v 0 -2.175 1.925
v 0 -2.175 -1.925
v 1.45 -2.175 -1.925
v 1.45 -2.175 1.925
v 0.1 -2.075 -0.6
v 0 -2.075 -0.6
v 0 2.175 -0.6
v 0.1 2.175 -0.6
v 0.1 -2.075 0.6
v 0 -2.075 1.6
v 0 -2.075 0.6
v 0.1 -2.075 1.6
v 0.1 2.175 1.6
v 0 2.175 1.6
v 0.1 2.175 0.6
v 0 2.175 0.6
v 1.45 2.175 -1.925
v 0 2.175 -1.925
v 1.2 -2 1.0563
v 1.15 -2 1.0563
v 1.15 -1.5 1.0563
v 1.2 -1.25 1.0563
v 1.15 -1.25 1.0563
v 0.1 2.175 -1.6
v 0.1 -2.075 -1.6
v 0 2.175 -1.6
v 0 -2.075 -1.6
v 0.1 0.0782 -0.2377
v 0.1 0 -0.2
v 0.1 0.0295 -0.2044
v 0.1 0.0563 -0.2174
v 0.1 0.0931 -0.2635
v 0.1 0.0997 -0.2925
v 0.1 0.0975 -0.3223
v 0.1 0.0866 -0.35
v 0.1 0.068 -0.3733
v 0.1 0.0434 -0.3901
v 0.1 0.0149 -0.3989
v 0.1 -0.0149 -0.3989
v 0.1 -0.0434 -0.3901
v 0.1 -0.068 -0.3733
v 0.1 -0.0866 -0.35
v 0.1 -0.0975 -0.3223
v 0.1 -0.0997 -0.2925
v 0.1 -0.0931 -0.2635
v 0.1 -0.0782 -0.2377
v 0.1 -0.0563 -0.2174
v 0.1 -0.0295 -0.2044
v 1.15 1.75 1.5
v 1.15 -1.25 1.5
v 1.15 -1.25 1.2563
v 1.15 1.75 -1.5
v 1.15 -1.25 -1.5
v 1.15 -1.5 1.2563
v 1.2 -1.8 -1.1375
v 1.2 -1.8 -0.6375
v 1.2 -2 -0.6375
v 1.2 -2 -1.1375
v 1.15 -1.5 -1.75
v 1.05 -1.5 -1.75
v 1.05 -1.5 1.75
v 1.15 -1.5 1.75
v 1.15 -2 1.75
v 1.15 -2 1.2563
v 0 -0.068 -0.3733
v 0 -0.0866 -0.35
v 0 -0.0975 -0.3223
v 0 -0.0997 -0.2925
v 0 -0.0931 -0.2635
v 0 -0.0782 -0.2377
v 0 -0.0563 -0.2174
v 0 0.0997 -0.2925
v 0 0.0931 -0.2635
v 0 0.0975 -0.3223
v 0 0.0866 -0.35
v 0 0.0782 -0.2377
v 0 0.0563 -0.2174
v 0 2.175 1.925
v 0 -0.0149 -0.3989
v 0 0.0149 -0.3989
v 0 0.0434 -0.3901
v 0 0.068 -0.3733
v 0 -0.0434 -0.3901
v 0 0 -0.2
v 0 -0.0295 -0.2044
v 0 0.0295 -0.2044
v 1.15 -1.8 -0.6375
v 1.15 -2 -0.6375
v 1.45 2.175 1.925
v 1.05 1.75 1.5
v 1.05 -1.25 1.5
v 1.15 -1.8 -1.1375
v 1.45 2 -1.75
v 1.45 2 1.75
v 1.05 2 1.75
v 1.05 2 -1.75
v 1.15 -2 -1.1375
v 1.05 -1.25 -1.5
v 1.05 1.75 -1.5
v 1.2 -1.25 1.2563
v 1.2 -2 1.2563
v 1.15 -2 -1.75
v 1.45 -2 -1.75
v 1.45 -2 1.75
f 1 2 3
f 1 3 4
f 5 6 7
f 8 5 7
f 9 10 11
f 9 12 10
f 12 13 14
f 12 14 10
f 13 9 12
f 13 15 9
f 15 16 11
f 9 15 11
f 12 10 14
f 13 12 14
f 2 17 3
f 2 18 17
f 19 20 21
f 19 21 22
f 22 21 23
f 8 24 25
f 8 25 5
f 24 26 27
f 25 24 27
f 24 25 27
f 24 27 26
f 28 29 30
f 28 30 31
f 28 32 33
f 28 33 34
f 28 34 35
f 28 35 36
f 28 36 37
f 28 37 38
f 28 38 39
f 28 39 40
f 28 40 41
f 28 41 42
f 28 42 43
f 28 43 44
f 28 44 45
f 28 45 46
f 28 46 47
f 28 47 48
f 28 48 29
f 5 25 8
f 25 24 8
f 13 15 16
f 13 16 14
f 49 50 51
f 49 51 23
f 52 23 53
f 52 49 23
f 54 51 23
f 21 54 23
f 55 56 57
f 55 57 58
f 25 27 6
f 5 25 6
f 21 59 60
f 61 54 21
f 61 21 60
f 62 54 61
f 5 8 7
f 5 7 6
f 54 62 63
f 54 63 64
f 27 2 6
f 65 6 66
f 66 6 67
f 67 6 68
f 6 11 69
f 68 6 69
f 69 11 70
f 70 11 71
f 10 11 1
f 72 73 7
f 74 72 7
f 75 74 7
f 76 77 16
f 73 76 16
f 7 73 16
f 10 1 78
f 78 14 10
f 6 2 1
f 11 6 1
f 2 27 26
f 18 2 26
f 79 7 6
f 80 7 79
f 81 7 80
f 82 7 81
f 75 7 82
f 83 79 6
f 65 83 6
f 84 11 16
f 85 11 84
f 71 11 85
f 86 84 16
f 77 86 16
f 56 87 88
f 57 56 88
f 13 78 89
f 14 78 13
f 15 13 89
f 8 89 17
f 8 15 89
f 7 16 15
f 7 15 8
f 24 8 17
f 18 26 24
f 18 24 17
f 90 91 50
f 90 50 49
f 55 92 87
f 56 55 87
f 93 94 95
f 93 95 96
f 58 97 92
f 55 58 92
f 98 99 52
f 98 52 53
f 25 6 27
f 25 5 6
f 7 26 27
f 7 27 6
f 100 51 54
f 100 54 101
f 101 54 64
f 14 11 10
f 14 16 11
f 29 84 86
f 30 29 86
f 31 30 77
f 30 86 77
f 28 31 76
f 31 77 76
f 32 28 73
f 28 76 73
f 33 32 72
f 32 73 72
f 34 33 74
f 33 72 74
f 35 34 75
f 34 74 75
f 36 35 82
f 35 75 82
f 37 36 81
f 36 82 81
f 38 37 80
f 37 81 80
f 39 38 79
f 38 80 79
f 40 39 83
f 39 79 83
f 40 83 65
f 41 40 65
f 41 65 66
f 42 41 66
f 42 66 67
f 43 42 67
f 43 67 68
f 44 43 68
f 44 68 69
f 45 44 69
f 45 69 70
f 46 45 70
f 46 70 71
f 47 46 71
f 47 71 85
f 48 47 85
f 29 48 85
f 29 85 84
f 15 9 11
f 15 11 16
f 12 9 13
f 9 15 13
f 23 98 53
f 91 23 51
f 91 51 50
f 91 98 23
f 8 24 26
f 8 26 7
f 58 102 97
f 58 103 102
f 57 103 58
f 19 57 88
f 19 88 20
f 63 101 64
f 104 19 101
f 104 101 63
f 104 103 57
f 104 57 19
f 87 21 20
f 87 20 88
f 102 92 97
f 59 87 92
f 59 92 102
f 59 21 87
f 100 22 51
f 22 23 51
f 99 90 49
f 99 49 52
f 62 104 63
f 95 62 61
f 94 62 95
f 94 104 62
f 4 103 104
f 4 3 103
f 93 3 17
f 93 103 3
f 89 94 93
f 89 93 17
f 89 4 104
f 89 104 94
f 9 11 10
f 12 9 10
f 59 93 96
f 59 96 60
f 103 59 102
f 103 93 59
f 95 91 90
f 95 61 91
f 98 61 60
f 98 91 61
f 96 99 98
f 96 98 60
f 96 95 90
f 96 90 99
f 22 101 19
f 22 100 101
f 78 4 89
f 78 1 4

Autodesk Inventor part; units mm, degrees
ref_plane "YZ Plane" through (0, 0, 0) normal (1, 0, 0) x (0, 1, 0)
ref_plane "XZ Plane" through (0, 0, 0) normal (0, 1, 0) x (-1, 0, 0)
ref_plane "XY Plane" through (0, 0, 0) normal (0, 0, 1) x (1, 0, 0)
sketch "Sketch1" plane through (0, 0, 0) normal (1, 0, 0) x (0, 1, 0)
  line L0 (-2.175, 1.925) -> (2.175, 1.925)
  line L1 (2.175, 1.925) -> (2.175, -1.925)
  line L2 (2.175, -1.925) -> (-2.175, -1.925)
  line L3 (-2.175, -1.925) -> (-2.175, 1.925)
  line L4 (-2.175, 1.925) -> (2.175, -1.925) construction
  line L5 (2.175, 1.925) -> (-2.175, -1.925) construction
  point P0 (0, 0)
  dimension "d0" = 4.35
  dimension "d1" = 3.85
extrude "Extrusion1" add sketch "Sketch1" along normal blind 1.45
sketch "Sketch2" plane through (1.45, 0, 0) normal (1, 0, 0) x (0, 0, -1)
  line L0 (1.75, -1.5) -> (-1.75, -1.5)
  line L1 (-1.75, -1.5) -> (-1.75, 2)
  line L2 (-1.75, 2) -> (1.75, 2)
  line L3 (1.75, 2) -> (1.75, -1.5)
  line L4 (1.75, -1.5) -> (-1.75, 2) construction
  line L5 (-1.75, -1.5) -> (1.75, 2) construction
  point P0 (0, 0)
  point P1 (0, 0.25)
  dimension "d4" = 0.25
  dimension "d5" = 3.5
  dimension "d6" = 3.5
extrude "Extrusion2" cut sketch "Sketch2" against normal blind 0.4
sketch "Sketch3" plane through (1.05, 0, 0) normal (1, 0, 0) x (0, 0, -1)
  line L0 (1.75, -1.5) -> (-1.75, -1.5) projected
  line L1 (1.75, 2) -> (1.75, -1.5) projected
  line L2 (-1.75, 2) -> (1.75, 2) projected
  line L3 (-1.75, -1.5) -> (-1.75, 2) projected
  line L4 (1.75, 2) -> (-1.75, -1.5) construction
  line L5 (1.5, -1.25) -> (-1.5, -1.25)
  line L6 (-1.5, -1.25) -> (-1.5, 1.75)
  line L7 (-1.5, 1.75) -> (1.5, 1.75)
  line L8 (1.5, 1.75) -> (1.5, -1.25)
  line L9 (1.5, -1.25) -> (-1.5, 1.75) construction
  line L10 (-1.5, -1.25) -> (1.5, 1.75) construction
  point P0 (0, 0)
  point P1 (0, 0.25)
  dimension "d9" = 3
  dimension "d10" = 3
extrude "Extrusion3" add sketch "Sketch3" along normal blind 0.1 contours L5 L6 L7 L8
sketch "Sketch4" plane through (1.45, 0, 0) normal (1, 0, 0) x (0, 0, -1)
  line L0 (1.75, 2) -> (1.75, -1.5) projected
  line L1 (1.75, -1.5) -> (-1.75, -1.5) projected
  line L2 (-1.75, -1.5) -> (-1.75, 2) projected
  line L3 (-1.75, 2) -> (1.75, 2) projected
  line L4 (-1.925, 2.175) -> (-1.925, -2.175) projected
  line L5 (-1.925, -2.175) -> (1.925, -2.175) projected
  line L6 (1.925, -2.175) -> (1.925, 2.175) projected
  line L7 (1.925, 2.175) -> (-1.925, 2.175) projected
  line L8 (-1.75, -1.5) -> (-1.75, 2) projected
  line L9 (-1.75, -1.5) -> (1.75, -1.5)
  line L10 (1.75, -1.5) -> (1.75, -2)
  line L11 (1.75, -2) -> (-1.75, -2)
  line L12 (-1.75, -2) -> (-1.75, -1.5)
  point P0 (0, 0)
  dimension "d13" = 0.5
extrude "Extrusion4" cut sketch "Sketch4" against normal blind 0.3 contours L10 L11 L12 L1
sketch "Sketch5" plane through (1.15, 0, 0) normal (1, 0, 0) x (0, 0, -1)
  line L0 (1.75, -2) -> (-1.75, -2) projected
  line L1 (-1.2563, -2) -> (-1.0563, -2)
  line L2 (-1.0563, -2) -> (-1.0563, -1.25)
  line L3 (-1.0563, -1.25) -> (-1.2563, -1.25)
  line L4 (-1.2563, -1.25) -> (-1.2563, -2)
  line L5 (0.6375, -2) -> (1.1375, -2)
  line L6 (1.1375, -2) -> (1.1375, -1.8)
  line L7 (1.1375, -1.8) -> (0.6375, -1.8)
  line L8 (0.6375, -1.8) -> (0.6375, -2)
  line L9 (-1.5, -1.25) -> (1.5, -1.25) projected
  point P0 (0, 0)
  dimension "d16" = 0.2
  dimension "d17" = 0.5
  dimension "d18" = 0.2
extrude "Extrusion5" add sketch "Sketch5" along normal blind 0.05
sketch "Sketch6" plane through (0, 0, 0) normal (-1, 0, 0) x (0, 0, 1)
  line L0 (1.925, -2.175) -> (1.925, 2.175) projected
  line L1 (1.925, 2.175) -> (-1.925, 2.175) projected
  line L2 (-1.925, 2.175) -> (-1.925, -2.175) projected
  line L3 (-1.925, -2.175) -> (1.925, -2.175) projected
  line L4 (1.6, 2.175) -> (0.6, 2.175)
  line L5 (0.6, 2.175) -> (0.6, -2.075)
  line L6 (0.6, -2.075) -> (1.6, -2.075)
  line L7 (1.6, -2.075) -> (1.6, 2.175)
  line L8 (-1.6, -2.075) -> (-0.6, -2.075)
  line L9 (-0.6, -2.075) -> (-0.6, 2.175)
  line L10 (-0.6, 2.175) -> (-1.6, 2.175)
  line L11 (-1.6, 2.175) -> (-1.6, -2.075)
  line L12 (1.925, 2.175) -> (-1.925, 2.175) projected
  point P0 (0, 0)
  point P1 (1.1, -2.075)
  point P2 (-1.1, -2.075)
  dimension "d21" = 1
  dimension "d22" = 1
  dimension "d23" = 4.25
  dimension "d24" = 4.25
  dimension "d25" = 1.1
  dimension "d26" = 1.1
extrude "Extrusion6" cut sketch "Sketch6" against normal blind 0.1 contours L7 L6 L5 L1 | L1 L9 L8 L11
sketch "Sketch7" plane through (0.1, 0, 0) normal (-1, 0, 0) x (0, 0, 1)
  line L0 (0.6, 2.175) -> (1.6, 2.175) projected
  line L1 (0.6, -2.075) -> (0.6, 2.175) projected
  line L2 (1.6, -2.075) -> (0.6, -2.075) projected
  line L3 (1.6, 2.175) -> (1.6, -2.075) projected
  line L4 (-0.6, -2.075) -> (-1.6, -2.075) projected
  line L5 (-0.6, 2.175) -> (-0.6, -2.075) projected
  line L6 (-1.6, 2.175) -> (-0.6, 2.175) projected
  line L7 (-1.6, -2.075) -> (-1.6, 2.175) projected
  point P0 (0, 0)
extrude "Extrusion7" add sketch "Sketch7" along normal up to surface (0.1 mm away) separate body
sketch "Sketch8" plane through (0, 0, 0) normal (-1, 0, 0) x (0, 0, 1)
  circle A0 centre (-0.3, 0) radius 0.1
  point P0 (0, 0)
  dimension "d31" = 0.2
  dimension "d32" = 0.3
extrude "Extrusion8" cut sketch "Sketch8" against normal blind 0.1 bodies 1
equation "\"d26\" = d25"
properties part number "S13360" material "ABS Plastic"
